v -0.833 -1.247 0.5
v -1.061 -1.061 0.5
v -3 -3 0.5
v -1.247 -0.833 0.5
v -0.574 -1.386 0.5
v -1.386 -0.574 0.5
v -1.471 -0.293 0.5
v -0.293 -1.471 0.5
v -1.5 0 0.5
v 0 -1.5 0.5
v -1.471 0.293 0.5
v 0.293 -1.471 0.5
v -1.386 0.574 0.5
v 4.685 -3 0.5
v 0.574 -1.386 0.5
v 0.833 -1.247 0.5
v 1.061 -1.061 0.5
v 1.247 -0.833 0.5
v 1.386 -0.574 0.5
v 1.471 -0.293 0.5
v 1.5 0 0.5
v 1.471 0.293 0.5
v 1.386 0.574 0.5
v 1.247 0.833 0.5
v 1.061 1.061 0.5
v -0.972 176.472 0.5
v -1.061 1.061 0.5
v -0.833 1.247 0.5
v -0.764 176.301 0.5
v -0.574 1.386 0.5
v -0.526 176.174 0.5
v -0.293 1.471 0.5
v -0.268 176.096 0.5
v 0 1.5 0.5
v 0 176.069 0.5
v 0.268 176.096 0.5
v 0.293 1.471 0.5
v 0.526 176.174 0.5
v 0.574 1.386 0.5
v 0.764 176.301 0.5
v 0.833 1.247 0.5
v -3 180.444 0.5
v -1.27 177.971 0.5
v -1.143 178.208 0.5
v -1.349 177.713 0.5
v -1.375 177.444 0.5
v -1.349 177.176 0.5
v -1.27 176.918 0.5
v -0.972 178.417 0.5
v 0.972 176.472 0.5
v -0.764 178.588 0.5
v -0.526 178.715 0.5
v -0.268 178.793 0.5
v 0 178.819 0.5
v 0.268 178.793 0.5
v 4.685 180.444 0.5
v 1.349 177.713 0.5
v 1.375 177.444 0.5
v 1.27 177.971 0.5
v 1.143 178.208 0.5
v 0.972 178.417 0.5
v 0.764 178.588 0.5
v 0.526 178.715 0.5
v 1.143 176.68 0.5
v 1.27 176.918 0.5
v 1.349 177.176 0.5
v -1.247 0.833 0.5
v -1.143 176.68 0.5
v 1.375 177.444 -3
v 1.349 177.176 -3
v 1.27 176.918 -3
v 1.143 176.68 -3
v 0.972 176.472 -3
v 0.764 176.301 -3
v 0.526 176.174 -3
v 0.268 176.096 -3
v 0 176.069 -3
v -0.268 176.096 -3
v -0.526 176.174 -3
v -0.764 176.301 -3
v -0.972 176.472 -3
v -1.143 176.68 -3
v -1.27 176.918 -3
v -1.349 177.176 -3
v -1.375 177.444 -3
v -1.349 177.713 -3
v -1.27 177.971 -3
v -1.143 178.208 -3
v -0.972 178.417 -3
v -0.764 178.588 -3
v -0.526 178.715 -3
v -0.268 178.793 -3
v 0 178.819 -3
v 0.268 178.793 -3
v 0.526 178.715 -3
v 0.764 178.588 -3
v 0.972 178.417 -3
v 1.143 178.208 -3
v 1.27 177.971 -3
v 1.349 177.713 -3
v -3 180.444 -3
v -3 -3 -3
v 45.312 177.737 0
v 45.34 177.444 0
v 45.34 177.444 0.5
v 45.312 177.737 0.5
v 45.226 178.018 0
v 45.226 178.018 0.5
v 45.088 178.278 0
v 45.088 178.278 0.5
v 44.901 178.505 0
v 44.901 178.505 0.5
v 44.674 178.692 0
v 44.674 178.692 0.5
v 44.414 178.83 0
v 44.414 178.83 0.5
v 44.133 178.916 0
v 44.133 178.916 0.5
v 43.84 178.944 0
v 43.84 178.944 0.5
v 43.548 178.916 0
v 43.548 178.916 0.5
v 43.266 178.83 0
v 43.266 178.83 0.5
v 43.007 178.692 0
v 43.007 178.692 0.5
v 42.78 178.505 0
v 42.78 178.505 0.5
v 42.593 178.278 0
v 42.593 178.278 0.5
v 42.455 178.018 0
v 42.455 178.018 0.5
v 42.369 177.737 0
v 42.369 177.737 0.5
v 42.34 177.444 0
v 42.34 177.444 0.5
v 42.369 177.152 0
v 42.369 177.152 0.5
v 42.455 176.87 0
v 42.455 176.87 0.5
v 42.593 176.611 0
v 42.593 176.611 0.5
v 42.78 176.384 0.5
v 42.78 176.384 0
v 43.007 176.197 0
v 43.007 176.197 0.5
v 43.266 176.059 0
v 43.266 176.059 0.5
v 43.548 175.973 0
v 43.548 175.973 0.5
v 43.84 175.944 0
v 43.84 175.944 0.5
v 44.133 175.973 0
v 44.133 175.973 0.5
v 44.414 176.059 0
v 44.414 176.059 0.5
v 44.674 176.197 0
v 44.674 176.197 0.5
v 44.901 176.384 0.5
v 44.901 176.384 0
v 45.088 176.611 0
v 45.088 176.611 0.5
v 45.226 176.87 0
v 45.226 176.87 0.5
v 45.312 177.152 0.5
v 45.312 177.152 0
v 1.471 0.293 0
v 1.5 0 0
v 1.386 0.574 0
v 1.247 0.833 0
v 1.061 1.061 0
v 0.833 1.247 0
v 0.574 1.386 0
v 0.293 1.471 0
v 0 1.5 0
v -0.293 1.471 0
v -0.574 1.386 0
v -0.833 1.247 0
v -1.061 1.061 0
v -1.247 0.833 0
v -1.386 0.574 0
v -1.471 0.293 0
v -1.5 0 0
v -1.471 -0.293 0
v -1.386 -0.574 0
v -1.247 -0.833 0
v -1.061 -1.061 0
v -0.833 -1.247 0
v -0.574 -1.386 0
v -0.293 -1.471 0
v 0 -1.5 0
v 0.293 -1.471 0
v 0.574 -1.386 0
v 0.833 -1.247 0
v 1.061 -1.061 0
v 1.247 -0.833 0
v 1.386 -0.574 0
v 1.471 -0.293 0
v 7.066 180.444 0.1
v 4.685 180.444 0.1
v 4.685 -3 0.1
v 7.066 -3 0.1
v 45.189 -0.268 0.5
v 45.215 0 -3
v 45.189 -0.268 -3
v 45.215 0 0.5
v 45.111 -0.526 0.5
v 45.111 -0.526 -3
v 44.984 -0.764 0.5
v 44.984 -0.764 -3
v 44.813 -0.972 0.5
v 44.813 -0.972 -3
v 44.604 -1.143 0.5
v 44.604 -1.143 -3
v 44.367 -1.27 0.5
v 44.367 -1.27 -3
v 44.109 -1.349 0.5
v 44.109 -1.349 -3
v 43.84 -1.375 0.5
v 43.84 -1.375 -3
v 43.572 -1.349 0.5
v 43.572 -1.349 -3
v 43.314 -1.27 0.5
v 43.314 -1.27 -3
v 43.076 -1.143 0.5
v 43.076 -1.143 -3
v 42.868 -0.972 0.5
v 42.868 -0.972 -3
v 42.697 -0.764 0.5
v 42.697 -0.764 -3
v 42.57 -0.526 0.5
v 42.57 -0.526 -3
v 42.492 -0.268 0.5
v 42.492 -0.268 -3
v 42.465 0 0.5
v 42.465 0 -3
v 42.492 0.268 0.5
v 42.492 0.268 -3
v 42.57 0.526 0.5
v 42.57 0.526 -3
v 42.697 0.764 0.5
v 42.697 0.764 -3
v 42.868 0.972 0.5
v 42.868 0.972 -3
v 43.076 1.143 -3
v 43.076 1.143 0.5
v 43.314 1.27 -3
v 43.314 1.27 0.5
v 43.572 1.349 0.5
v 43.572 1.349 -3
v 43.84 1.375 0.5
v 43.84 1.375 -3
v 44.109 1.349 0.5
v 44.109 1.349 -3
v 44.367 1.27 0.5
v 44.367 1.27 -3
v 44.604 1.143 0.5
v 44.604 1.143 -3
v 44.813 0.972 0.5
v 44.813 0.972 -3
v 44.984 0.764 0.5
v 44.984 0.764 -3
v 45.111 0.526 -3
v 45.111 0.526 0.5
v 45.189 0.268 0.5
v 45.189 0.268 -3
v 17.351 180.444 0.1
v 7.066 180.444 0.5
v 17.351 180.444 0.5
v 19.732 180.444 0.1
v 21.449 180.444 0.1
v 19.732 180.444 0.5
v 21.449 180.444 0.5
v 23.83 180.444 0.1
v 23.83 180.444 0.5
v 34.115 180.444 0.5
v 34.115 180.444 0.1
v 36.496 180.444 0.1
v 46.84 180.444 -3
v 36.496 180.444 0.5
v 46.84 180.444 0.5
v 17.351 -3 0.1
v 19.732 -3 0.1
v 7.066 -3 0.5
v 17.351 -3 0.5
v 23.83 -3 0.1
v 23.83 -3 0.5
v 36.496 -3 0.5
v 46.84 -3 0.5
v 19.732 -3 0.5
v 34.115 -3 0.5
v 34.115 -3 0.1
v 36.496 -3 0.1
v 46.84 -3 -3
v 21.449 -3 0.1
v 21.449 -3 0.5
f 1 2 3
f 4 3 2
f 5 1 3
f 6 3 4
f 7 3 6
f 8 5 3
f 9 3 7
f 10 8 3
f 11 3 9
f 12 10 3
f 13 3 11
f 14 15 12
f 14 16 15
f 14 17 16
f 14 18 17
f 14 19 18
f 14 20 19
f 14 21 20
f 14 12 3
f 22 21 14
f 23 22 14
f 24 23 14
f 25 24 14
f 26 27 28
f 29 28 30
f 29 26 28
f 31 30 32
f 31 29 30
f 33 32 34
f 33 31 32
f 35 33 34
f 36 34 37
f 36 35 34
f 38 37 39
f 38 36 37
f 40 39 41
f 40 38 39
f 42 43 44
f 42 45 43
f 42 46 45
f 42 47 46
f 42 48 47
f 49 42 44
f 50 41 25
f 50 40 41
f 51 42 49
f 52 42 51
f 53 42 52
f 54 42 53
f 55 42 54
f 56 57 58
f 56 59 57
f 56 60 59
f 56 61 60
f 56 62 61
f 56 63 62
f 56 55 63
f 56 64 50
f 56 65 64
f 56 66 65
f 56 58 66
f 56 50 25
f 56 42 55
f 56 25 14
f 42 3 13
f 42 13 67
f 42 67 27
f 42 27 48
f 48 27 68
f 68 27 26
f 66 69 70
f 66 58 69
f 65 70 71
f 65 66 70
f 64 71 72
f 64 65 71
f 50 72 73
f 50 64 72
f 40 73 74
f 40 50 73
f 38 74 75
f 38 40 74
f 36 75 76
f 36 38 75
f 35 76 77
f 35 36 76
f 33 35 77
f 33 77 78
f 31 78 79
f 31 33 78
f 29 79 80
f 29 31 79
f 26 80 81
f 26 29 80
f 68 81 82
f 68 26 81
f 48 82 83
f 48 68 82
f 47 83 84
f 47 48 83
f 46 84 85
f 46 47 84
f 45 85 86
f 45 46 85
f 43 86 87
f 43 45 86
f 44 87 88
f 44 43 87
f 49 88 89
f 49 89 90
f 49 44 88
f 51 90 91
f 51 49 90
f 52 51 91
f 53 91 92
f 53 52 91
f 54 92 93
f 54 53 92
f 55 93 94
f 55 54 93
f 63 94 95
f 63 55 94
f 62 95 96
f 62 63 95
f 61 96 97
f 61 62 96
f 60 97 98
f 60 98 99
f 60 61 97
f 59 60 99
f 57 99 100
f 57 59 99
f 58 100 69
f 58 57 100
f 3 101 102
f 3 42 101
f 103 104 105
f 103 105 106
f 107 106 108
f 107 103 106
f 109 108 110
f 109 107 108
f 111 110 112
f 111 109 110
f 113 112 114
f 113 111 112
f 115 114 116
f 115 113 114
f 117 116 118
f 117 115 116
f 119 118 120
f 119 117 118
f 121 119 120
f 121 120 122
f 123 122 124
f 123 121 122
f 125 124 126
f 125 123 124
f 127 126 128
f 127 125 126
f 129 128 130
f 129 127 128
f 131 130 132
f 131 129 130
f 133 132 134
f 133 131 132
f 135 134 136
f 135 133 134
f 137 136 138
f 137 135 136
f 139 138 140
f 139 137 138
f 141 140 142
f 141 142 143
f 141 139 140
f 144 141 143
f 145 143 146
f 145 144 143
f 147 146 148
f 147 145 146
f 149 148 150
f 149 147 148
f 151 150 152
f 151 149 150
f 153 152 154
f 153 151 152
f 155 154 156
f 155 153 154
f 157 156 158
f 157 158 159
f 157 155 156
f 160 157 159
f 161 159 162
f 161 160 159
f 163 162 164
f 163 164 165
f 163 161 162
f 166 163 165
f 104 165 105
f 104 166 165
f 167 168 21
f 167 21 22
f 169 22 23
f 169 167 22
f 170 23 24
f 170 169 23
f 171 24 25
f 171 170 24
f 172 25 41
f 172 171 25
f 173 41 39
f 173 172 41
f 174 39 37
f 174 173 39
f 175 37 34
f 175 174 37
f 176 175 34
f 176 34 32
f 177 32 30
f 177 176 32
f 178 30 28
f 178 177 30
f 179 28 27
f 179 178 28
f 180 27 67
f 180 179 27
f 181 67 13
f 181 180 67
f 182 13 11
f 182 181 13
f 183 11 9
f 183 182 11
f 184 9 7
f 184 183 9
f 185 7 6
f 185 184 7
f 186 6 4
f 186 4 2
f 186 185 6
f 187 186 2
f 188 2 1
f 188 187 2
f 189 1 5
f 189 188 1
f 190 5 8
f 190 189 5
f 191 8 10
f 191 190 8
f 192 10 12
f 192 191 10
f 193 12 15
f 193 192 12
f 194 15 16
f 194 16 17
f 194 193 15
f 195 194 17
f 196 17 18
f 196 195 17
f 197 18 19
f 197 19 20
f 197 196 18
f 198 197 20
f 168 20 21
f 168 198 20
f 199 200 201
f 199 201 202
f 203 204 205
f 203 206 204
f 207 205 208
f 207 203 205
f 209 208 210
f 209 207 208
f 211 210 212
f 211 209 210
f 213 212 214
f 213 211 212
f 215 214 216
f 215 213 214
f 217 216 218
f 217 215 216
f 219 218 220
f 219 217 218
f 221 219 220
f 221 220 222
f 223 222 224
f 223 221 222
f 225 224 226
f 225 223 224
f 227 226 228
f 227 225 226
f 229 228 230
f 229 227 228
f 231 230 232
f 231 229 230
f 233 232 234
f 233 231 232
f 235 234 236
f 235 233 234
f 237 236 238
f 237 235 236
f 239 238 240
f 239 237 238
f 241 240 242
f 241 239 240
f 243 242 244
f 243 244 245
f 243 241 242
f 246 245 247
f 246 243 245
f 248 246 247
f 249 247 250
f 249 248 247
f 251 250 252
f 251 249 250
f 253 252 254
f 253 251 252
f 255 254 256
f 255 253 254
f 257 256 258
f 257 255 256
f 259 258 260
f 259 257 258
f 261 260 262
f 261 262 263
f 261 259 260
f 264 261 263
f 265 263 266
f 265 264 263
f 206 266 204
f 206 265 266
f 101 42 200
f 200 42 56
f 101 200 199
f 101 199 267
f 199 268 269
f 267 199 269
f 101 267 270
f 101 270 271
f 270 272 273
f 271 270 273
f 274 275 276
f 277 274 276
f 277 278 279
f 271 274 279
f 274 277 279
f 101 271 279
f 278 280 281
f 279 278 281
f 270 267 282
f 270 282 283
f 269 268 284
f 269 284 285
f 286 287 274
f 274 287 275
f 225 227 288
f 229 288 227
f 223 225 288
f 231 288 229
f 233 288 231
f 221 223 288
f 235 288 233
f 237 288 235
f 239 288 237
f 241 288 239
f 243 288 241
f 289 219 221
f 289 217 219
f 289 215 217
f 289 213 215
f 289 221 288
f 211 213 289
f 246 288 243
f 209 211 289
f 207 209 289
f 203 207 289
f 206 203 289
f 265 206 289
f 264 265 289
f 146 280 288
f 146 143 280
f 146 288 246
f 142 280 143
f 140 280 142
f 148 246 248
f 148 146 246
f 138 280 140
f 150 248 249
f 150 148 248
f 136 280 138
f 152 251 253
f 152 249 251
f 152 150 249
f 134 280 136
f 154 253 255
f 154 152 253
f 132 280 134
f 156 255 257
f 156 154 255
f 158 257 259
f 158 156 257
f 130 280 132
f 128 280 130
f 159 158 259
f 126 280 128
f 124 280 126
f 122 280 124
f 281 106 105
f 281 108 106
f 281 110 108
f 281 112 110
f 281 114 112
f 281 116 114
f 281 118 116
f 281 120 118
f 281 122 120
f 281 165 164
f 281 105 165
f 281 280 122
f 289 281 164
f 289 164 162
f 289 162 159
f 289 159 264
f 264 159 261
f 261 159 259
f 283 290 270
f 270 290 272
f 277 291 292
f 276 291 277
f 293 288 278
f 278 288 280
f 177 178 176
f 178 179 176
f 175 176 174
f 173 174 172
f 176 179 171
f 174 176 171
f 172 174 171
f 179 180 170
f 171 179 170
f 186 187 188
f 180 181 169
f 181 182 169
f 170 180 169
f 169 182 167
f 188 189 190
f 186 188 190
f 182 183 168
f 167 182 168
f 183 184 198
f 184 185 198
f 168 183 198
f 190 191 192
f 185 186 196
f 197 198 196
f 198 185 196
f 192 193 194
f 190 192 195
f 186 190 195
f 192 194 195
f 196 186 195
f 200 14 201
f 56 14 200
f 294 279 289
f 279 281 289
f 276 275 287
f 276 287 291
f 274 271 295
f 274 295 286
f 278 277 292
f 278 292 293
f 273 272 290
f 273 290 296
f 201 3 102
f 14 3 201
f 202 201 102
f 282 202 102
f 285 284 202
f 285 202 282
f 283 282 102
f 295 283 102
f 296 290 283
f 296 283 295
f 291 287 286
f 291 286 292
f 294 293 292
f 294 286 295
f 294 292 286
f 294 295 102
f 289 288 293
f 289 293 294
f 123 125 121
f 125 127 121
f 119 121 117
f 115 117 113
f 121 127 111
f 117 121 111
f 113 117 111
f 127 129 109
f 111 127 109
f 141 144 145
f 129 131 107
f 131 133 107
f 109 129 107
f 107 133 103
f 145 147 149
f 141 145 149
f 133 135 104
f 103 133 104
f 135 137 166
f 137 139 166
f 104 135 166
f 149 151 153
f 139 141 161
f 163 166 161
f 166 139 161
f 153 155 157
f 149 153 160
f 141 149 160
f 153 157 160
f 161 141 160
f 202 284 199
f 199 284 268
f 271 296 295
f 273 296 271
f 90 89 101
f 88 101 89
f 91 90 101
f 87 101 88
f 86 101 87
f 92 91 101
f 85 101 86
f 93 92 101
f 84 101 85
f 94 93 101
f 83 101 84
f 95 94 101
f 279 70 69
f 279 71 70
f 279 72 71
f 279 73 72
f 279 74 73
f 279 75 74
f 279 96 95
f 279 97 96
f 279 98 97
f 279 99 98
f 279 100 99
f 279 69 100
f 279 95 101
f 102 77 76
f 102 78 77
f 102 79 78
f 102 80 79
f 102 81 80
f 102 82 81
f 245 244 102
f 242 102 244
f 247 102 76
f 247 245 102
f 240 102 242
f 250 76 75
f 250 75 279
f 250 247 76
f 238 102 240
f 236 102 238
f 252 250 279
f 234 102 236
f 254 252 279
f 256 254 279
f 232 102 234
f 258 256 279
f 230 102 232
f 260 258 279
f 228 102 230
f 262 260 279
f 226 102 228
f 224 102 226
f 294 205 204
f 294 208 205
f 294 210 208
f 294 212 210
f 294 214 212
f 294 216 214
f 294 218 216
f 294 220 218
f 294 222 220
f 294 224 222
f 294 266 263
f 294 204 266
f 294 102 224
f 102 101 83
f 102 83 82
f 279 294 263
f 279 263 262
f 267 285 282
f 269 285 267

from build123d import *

# Parameters (mm, degrees)
F0_W     = 49.8404
F0_H     = 183.4444
F0_R     = 1.5
F0_R_2   = 1.375
F1_DEPTH = 0.5
F2_W     = 49.8404
F2_H     = 183.4444
F2_R     = 1.375
F3_DEPTH = 3
F4_W     = 2.381
F4_H     = 183.4444
F5_DEPTH = 0.4


with BuildPart() as f1:
    # F0 (on Top) → F1 (new body)
    with BuildSketch(Plane.XY):
        with Locations((21.9202, 88.7222)):
            Rectangle(F0_W, F0_H)
        Circle(F0_R, mode=Mode.SUBTRACT)
        with Locations((43.8404, 0)):
            Circle(F0_R_2, mode=Mode.SUBTRACT)
        with Locations((0, 177.4444)):
            Circle(F0_R_2, mode=Mode.SUBTRACT)
        with Locations((43.8404, 177.4444)):
            Circle(F0_R, mode=Mode.SUBTRACT)
    extrude(amount=F1_DEPTH)

    # F2 (on face) → F3 (join)
    with BuildSketch(Plane(origin=(0, 0, 0), x_dir=(1, 0, 0), z_dir=(0, 0, -1))):
        with Locations((21.9202, -88.7222)):
            Rectangle(F2_W, F2_H)
        with Locations((0, -177.4444)):
            Circle(F2_R, mode=Mode.SUBTRACT)
        with Locations((43.8404, 0)):
            Circle(F2_R, mode=Mode.SUBTRACT)
    extrude(amount=F3_DEPTH)

    # F4 (on face) → F5 (cut)
    with BuildSketch(Plane.XY.offset(0.5)):
        with Locations((5.8755, 88.7222)):
            Rectangle(F4_W, F4_H)
        with Locations((18.5415, 88.7222)):
            Rectangle(F4_W, F4_H)
        with Locations((22.6395, 88.7222)):
            Rectangle(F4_W, F4_H)
        with Locations((35.3055, 88.7222)):
            Rectangle(F4_W, F4_H)
    extrude(amount=-F5_DEPTH, mode=Mode.SUBTRACT)


solid = f1.part
